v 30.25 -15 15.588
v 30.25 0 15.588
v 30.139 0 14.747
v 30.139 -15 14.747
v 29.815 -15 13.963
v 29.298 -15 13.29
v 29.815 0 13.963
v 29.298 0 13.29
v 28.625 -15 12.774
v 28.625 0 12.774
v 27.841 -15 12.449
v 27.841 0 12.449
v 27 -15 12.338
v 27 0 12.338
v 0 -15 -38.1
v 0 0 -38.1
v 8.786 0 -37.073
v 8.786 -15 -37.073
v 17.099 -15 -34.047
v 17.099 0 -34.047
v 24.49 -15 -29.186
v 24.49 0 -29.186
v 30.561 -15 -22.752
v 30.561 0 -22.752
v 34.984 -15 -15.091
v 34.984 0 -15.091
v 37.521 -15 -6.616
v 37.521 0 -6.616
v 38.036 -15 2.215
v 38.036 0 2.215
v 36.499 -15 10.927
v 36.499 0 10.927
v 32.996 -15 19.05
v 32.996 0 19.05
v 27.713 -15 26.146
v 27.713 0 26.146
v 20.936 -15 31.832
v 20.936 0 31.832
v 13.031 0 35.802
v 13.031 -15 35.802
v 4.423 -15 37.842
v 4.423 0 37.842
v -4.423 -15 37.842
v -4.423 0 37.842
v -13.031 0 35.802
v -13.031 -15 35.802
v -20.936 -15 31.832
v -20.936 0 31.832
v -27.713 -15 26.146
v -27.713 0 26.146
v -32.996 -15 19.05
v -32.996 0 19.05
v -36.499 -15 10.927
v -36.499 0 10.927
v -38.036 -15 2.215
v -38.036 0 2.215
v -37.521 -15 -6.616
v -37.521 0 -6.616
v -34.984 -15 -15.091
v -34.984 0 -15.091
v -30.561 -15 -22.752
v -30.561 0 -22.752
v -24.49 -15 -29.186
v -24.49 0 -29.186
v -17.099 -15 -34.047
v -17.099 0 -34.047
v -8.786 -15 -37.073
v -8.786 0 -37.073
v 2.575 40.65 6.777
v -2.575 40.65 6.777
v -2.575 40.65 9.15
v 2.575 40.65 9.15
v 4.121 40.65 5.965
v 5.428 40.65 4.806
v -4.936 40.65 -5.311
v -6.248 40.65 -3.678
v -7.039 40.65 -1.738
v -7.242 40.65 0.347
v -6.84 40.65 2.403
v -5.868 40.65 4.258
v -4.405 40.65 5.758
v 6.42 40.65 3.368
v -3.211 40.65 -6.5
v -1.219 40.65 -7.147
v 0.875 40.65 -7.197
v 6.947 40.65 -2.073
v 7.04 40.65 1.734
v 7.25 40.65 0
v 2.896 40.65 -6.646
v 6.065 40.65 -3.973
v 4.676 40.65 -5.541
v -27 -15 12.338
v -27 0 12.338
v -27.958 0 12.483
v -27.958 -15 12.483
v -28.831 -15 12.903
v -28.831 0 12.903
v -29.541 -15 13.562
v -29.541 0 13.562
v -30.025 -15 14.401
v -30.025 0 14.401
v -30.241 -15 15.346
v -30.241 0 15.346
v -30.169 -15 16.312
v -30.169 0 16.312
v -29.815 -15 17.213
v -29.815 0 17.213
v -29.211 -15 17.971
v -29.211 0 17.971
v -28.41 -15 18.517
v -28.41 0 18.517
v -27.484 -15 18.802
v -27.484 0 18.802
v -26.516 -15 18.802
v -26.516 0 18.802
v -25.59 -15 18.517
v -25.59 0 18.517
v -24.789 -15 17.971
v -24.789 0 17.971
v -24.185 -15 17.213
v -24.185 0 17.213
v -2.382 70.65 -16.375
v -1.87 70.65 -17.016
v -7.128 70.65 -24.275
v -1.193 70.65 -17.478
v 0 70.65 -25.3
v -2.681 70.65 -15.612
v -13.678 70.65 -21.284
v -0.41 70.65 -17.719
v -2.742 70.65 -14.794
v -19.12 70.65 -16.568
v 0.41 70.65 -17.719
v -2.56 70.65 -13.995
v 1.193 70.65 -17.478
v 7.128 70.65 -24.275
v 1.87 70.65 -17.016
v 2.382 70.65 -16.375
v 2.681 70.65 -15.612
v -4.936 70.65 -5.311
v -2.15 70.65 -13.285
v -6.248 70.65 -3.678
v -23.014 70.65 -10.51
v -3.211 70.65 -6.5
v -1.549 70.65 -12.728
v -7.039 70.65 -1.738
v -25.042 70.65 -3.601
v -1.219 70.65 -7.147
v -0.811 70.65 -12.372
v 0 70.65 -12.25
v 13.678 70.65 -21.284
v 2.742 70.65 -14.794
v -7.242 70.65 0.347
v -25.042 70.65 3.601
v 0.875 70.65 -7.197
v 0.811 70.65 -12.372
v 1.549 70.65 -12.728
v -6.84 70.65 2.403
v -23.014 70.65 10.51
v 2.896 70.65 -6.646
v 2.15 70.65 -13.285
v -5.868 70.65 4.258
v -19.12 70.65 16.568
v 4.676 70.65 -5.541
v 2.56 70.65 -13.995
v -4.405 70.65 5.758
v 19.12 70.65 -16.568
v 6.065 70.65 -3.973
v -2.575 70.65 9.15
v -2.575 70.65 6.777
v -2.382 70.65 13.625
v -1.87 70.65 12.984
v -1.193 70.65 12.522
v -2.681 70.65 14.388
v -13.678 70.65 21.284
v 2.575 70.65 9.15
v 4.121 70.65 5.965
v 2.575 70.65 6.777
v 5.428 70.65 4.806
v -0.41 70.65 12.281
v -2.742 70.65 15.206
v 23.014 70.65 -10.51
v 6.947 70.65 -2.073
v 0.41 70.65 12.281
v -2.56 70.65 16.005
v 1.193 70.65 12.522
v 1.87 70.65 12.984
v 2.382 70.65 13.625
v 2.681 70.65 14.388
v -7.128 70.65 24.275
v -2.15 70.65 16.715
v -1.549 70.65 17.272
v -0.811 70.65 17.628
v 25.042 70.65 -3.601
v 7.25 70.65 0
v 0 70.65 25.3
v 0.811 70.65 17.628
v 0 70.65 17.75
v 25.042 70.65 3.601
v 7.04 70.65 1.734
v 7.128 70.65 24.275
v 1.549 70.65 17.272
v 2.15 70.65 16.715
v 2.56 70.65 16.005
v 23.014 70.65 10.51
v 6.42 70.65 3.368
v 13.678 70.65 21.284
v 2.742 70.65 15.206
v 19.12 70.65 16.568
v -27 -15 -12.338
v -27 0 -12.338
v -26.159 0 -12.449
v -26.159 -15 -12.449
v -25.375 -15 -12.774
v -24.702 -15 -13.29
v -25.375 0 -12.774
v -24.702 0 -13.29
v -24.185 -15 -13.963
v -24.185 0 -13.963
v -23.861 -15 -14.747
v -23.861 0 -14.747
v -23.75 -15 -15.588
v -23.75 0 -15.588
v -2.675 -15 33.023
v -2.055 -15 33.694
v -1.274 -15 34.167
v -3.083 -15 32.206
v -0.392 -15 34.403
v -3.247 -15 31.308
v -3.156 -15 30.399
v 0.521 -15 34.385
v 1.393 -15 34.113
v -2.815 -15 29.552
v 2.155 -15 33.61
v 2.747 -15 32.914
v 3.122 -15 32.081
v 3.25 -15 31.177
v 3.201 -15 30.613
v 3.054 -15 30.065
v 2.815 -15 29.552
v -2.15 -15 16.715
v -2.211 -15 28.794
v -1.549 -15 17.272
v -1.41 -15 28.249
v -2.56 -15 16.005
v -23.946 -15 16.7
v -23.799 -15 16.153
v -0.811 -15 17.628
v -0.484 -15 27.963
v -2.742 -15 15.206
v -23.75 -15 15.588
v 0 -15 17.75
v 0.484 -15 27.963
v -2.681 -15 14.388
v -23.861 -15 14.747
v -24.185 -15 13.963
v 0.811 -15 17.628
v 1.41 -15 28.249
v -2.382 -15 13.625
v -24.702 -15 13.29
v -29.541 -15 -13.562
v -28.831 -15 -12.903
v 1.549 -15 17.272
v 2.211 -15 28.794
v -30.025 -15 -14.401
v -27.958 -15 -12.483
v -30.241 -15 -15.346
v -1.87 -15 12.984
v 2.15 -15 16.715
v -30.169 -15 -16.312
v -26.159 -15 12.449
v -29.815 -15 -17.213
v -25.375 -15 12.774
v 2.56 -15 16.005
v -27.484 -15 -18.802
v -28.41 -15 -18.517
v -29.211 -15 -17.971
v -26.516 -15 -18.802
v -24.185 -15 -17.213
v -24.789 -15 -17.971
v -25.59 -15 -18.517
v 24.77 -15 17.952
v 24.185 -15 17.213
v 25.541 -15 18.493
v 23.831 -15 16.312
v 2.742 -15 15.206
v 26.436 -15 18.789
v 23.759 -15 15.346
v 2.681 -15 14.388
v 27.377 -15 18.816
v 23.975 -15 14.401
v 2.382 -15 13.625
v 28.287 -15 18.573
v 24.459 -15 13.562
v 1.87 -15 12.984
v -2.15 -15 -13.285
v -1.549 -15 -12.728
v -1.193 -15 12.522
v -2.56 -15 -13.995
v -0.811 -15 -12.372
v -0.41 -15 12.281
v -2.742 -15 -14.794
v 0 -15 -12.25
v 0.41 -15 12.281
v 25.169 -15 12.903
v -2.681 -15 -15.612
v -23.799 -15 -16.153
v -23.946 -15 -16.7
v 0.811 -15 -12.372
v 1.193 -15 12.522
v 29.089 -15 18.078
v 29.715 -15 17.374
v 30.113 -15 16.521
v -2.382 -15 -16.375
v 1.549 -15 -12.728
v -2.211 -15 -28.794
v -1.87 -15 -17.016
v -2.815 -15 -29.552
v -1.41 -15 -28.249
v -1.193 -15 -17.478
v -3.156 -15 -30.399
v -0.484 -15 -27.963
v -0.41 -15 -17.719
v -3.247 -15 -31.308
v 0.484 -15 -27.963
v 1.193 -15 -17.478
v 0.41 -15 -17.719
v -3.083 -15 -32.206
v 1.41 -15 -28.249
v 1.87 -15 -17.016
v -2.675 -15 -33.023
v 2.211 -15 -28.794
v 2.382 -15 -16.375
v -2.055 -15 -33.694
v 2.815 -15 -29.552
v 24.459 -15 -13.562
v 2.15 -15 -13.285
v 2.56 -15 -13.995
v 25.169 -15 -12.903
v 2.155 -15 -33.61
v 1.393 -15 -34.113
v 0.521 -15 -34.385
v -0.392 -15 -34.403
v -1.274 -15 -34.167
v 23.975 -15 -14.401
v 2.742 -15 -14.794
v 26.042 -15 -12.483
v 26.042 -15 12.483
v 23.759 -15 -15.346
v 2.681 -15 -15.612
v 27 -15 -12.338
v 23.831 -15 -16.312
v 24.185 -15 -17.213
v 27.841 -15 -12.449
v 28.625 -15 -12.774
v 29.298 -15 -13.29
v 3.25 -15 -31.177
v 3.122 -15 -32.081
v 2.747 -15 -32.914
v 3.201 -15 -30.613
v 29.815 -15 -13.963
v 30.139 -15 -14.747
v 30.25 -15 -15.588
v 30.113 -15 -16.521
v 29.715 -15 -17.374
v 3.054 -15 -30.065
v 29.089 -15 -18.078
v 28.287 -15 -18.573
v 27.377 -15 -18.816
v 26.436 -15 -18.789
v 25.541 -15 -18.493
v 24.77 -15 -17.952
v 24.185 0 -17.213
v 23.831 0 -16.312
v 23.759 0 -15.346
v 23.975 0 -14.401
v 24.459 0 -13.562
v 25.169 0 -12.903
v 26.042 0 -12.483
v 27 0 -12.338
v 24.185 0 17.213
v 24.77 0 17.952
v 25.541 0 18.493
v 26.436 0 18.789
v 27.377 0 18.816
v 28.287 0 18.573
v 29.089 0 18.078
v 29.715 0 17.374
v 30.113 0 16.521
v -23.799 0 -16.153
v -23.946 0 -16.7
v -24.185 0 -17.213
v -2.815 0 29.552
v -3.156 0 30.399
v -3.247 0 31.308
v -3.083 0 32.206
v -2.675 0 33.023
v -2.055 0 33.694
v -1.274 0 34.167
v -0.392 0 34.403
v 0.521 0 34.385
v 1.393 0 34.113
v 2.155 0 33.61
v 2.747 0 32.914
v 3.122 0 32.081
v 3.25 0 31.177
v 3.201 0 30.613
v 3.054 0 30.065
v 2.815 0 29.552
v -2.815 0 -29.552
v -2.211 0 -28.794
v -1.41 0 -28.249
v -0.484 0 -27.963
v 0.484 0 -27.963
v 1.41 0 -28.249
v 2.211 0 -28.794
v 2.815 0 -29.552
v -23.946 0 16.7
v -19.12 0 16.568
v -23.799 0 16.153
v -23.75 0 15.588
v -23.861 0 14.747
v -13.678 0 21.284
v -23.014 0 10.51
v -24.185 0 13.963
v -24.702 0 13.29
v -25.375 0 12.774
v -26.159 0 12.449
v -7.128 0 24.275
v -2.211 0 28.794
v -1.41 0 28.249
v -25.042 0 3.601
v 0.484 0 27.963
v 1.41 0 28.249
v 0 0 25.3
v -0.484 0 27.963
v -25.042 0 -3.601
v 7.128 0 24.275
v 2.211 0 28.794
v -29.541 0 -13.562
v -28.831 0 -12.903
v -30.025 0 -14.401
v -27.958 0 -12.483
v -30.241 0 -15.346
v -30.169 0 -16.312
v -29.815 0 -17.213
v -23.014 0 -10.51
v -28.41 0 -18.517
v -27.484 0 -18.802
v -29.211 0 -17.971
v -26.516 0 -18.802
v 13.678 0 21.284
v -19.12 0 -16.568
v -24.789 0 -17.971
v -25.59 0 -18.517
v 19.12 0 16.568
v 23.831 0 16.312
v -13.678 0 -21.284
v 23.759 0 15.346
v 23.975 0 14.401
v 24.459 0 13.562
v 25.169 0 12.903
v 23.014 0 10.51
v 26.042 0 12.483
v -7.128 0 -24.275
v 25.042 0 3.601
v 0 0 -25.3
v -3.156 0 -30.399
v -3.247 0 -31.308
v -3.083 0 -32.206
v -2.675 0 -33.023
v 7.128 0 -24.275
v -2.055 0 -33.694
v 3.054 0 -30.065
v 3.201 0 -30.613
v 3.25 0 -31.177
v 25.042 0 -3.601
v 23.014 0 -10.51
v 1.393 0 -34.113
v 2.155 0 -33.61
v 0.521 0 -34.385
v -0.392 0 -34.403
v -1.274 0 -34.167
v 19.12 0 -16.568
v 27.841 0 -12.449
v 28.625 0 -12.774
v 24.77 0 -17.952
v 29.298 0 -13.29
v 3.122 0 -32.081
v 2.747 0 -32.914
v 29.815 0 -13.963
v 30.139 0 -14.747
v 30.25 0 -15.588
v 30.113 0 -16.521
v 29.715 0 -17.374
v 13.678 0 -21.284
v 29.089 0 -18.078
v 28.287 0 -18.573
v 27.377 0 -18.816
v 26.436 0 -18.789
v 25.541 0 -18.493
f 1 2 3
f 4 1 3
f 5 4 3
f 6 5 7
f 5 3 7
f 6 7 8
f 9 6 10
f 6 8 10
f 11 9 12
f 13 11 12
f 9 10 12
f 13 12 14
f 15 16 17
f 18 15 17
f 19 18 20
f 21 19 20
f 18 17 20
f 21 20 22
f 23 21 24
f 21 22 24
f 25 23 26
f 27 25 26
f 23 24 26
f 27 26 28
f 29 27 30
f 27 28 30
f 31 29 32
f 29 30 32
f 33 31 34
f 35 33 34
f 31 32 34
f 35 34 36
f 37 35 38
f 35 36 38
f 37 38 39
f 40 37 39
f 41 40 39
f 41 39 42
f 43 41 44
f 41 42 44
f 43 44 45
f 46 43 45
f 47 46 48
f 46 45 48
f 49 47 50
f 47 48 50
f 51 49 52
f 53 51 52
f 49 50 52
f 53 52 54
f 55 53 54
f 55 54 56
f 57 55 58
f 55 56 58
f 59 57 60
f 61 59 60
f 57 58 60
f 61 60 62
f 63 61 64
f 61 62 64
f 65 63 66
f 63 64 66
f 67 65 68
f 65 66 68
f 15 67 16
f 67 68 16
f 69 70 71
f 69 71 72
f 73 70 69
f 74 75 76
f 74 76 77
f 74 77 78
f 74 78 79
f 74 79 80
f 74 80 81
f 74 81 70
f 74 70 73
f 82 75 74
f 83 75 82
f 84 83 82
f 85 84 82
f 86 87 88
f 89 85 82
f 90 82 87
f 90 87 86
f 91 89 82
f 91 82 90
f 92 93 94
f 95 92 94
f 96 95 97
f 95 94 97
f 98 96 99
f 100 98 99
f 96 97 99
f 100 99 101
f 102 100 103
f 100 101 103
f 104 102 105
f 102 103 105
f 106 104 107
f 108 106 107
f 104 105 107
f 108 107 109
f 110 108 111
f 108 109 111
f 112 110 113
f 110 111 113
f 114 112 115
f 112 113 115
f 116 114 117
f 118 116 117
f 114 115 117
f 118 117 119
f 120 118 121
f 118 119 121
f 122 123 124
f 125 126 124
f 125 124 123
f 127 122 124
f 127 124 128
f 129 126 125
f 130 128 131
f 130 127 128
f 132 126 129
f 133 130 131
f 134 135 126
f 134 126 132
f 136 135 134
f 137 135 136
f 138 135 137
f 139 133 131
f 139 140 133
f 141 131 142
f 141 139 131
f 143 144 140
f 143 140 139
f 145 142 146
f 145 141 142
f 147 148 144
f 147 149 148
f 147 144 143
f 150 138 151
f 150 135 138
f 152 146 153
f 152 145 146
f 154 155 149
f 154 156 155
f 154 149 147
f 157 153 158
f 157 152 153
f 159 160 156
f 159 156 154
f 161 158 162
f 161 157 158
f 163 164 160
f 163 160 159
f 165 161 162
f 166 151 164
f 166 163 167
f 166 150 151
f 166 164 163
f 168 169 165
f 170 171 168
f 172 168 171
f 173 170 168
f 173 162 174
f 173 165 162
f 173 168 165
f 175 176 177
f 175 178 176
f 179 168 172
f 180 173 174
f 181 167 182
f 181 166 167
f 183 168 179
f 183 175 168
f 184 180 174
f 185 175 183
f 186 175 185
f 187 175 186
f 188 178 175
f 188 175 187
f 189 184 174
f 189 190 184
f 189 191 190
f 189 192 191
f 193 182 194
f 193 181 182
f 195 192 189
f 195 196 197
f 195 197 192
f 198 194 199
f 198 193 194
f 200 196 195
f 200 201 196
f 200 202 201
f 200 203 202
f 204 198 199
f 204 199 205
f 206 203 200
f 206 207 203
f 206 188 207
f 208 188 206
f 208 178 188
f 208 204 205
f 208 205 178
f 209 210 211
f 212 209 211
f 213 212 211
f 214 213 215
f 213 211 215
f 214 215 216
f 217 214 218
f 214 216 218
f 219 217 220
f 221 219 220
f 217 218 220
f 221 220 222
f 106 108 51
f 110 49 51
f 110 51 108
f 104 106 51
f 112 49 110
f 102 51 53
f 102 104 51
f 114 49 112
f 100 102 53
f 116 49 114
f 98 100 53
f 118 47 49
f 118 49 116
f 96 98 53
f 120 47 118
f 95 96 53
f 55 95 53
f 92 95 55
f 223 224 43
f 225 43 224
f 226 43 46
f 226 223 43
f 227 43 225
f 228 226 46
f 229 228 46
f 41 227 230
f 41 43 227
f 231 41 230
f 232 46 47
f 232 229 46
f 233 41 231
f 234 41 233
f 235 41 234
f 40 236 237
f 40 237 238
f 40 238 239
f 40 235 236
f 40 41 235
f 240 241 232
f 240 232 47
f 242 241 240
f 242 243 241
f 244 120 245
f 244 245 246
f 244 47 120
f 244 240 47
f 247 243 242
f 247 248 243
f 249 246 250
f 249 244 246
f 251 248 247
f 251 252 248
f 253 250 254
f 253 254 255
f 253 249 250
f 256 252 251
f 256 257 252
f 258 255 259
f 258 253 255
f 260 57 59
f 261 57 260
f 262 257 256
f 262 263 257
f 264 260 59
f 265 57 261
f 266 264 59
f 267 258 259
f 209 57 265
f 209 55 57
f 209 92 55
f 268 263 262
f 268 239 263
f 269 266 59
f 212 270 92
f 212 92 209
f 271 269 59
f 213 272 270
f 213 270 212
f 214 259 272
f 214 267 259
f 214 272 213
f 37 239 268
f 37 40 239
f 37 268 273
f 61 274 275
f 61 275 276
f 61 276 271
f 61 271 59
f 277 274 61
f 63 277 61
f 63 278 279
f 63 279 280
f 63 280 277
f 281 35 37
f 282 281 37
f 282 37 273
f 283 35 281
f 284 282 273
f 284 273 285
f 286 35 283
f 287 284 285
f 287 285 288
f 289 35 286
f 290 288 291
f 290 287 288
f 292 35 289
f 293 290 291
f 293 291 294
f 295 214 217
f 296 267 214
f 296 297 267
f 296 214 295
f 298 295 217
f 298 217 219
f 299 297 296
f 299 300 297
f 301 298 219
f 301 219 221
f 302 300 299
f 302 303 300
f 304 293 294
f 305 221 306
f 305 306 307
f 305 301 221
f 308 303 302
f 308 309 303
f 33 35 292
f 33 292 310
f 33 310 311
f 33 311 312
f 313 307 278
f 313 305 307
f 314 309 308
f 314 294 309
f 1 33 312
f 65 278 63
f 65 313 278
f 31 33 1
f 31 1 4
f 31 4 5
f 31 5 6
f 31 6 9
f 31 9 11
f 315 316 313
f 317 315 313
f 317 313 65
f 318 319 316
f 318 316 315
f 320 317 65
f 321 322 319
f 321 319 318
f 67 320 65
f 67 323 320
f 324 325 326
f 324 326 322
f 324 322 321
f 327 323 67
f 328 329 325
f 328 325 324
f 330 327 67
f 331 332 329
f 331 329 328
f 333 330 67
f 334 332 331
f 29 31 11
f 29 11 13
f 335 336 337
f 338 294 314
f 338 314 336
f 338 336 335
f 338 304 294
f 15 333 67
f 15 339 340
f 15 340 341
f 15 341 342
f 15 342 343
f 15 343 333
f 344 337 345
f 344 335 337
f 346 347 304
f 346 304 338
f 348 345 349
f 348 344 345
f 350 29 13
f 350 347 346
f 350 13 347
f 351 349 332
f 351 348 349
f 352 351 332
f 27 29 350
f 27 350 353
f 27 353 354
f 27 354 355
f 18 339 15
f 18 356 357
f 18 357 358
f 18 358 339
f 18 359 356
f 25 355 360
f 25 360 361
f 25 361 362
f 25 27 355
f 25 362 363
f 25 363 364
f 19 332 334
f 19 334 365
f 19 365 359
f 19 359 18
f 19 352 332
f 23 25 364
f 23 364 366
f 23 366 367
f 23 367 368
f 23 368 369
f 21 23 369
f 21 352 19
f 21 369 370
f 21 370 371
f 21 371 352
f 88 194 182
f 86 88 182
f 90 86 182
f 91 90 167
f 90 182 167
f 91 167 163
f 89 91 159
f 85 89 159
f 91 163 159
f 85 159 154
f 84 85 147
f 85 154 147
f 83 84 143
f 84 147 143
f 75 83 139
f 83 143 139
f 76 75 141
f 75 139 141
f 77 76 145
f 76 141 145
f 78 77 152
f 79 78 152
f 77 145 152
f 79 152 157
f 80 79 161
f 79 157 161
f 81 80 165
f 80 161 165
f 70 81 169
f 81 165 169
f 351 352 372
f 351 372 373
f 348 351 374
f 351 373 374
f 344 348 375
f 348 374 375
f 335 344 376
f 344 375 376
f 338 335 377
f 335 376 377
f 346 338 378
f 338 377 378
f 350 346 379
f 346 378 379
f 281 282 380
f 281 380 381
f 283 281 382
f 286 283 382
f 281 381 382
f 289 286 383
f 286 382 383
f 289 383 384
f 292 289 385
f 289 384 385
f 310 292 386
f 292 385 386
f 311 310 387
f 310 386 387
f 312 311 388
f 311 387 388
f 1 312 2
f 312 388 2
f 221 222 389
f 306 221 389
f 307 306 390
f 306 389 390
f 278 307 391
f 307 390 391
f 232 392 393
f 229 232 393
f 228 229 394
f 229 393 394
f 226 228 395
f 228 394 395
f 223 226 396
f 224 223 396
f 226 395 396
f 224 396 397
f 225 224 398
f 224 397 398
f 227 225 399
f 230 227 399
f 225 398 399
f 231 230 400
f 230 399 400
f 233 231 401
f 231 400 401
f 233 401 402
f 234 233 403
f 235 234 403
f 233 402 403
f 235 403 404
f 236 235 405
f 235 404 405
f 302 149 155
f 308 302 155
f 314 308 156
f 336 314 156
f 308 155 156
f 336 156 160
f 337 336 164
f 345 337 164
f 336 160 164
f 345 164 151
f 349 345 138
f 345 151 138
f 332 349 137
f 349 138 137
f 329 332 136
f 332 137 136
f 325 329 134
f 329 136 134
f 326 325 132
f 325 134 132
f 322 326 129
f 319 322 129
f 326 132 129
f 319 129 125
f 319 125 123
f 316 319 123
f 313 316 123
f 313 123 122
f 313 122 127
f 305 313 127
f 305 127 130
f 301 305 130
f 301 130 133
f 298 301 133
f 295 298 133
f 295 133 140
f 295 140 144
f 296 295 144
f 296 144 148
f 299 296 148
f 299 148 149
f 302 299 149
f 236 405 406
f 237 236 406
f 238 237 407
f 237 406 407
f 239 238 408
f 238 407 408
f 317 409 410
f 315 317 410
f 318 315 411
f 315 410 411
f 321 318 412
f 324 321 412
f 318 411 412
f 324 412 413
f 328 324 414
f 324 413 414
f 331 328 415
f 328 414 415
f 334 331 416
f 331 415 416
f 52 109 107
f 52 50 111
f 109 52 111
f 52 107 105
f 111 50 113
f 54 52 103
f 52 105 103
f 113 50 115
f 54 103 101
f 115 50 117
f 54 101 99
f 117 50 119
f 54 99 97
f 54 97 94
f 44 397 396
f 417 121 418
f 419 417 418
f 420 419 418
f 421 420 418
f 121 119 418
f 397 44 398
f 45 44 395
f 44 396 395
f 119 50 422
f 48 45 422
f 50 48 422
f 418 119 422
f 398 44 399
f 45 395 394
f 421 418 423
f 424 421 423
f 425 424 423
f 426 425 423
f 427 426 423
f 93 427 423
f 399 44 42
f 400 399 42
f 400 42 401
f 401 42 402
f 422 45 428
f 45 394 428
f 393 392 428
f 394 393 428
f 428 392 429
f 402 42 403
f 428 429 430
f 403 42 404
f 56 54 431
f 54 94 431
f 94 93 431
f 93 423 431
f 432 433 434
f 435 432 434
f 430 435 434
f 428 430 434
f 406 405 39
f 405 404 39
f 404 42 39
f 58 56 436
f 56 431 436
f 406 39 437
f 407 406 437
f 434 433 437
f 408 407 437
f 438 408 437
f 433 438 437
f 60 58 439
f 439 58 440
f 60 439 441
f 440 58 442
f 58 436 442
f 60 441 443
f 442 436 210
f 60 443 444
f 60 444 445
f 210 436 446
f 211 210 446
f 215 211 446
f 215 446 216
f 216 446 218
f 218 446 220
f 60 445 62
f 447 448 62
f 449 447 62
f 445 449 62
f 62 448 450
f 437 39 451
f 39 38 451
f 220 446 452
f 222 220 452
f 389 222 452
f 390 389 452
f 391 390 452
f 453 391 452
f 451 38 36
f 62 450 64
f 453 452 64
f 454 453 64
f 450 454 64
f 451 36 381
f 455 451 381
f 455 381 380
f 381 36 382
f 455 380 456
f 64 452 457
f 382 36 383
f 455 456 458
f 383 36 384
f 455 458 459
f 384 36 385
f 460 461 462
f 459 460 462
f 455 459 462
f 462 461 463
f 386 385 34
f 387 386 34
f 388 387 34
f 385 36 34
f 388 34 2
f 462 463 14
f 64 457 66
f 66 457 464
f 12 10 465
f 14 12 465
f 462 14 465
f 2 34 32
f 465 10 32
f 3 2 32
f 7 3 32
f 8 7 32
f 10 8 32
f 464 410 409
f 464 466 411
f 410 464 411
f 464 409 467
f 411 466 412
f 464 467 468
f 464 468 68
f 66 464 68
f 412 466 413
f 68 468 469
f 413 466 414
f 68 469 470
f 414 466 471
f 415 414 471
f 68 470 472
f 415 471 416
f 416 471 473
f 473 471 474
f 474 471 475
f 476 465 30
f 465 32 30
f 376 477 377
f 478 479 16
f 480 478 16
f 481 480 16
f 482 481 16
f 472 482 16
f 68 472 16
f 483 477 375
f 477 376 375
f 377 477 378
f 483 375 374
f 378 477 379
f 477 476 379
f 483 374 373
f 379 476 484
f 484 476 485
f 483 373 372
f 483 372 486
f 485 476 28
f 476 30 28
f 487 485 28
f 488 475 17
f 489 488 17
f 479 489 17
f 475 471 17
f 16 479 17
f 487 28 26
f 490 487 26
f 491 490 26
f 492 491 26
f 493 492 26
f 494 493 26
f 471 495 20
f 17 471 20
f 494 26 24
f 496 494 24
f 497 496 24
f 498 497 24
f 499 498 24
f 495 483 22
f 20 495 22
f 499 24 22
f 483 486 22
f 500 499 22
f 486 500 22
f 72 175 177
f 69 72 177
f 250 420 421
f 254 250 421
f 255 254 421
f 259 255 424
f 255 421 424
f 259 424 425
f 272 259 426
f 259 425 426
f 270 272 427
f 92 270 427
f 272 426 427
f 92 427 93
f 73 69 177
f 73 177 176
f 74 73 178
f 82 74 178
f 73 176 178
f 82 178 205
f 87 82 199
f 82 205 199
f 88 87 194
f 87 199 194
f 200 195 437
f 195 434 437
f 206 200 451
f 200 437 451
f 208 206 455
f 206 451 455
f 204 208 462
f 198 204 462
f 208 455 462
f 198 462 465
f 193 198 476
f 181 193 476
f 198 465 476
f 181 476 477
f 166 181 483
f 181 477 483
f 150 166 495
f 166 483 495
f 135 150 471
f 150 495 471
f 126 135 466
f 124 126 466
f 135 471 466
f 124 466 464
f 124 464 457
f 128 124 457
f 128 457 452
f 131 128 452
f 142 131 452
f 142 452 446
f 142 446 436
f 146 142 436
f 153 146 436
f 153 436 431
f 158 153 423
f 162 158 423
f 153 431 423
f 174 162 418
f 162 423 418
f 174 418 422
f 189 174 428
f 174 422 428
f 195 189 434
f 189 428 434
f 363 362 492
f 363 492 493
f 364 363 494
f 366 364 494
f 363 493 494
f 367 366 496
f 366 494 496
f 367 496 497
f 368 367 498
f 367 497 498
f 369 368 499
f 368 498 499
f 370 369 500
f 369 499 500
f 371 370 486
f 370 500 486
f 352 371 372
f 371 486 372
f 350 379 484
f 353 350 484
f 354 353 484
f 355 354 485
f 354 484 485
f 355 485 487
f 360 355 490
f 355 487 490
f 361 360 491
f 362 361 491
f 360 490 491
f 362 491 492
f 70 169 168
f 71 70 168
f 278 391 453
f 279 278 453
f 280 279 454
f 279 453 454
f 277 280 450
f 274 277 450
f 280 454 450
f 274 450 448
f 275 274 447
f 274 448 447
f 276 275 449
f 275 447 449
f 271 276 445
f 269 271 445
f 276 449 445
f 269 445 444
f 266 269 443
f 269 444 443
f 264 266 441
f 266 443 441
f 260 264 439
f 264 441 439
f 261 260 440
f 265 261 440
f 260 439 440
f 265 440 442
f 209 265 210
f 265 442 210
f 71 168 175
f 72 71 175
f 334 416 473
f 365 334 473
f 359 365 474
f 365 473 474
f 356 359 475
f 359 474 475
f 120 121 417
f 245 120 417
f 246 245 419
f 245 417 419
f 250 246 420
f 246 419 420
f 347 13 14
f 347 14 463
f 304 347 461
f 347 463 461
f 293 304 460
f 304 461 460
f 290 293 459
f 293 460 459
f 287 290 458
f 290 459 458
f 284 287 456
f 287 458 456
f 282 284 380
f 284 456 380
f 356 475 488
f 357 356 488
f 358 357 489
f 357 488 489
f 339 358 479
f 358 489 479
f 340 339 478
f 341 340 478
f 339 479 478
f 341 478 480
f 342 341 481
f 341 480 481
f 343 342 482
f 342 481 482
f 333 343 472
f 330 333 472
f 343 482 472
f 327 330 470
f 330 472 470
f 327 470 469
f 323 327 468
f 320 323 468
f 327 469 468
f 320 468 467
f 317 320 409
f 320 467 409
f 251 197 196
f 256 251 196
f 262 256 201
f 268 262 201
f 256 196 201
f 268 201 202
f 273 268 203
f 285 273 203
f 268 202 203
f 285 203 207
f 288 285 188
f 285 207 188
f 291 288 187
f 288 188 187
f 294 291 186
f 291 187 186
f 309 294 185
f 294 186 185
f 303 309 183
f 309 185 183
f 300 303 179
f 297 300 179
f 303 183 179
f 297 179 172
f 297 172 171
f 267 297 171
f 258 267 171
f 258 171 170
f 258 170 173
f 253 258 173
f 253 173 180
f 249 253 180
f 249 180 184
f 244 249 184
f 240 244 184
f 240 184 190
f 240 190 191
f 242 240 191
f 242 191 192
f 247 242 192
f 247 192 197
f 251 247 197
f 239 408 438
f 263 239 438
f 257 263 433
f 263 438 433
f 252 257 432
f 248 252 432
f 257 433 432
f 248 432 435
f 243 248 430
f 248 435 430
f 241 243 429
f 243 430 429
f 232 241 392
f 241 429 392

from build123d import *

# Parameters (mm, degrees)
SKETCH1_R           = 25.3
BOSS_EXTRUDE1_DEPTH = 8.5
SKETCH2_R           = 25.3
BOSS_EXTRUDE2_DEPTH = 57.15
SKETCH7_R           = 25.3
BOSS_EXTRUDE4_DEPTH = 15
CUT_EXTRUDE3_DEPTH  = 115
SKETCH6_R           = 38.1
BOSS_EXTRUDE3_DEPTH = 15
SKETCH9_R           = 3.25
CUT_EXTRUDE4_DEPTH  = 20
SKETCH10_R          = 2.75
CUT_EXTRUDE6_DEPTH  = 129
BOSS_EXTRUDE5_START = -93
BOSS_EXTRUDE5_DEPTH = 93
CUT_EXTRUDE7_DEPTH  = 40
CUT_EXTRUDE8_START  = -10
SKETCH12_R          = 25.3
CUT_EXTRUDE8_DEPTH  = 10


with BuildPart() as part:
    # Sketch1 → Boss-Extrude1 (new body)
    with BuildSketch(Plane(origin=(0, 0, 0), x_dir=(1, 0, 0), z_dir=(0, 1, 0))):
        Circle(SKETCH1_R)
    extrude(amount=BOSS_EXTRUDE1_DEPTH)

    # Sketch2 → Boss-Extrude2 (add)
    with BuildSketch(Plane(origin=(0, 8.5, 0), x_dir=(1, 0, 0), z_dir=(0, 1, 0))):
        Circle(SKETCH2_R)
    extrude(amount=BOSS_EXTRUDE2_DEPTH)

    # Sketch7 → Boss-Extrude4 (add)
    with BuildSketch(Plane(origin=(0, 65.65, 0), x_dir=(1, 0, 0), z_dir=(0, 1, 0))):
        Circle(SKETCH7_R)
    extrude(amount=BOSS_EXTRUDE4_DEPTH)

    # Sketch5 → Cut-Extrude3 (cut)
    with BuildSketch(Plane.XZ):
        with BuildLine():
            Line((2.575, 9.15), (-2.575, 9.15))
            Line((-2.575, 9.15), (-2.575, 6.777305881))
            ThreePointArc((-2.575, 6.777305881), (0, -7.25), (2.575, 6.777305881))
            Line((2.575, 6.777305881), (2.575, 9.15))
        make_face()
    extrude(amount=-CUT_EXTRUDE3_DEPTH, mode=Mode.SUBTRACT)

    # Sketch6 → Boss-Extrude3 (add)
    with BuildSketch(Plane.XZ):
        Circle(SKETCH6_R)
    extrude(amount=BOSS_EXTRUDE3_DEPTH)

    # Sketch9 → Cut-Extrude4 (cut)
    with BuildSketch(Plane(origin=(0, 0, 0), x_dir=(1, 0, 0), z_dir=(0, 1, 0))):
        with Locations((0, 31.176914536)):
            Circle(SKETCH9_R)
        with Locations((-27, 15.588457268)):
            Circle(SKETCH9_R)
        with Locations((27, 15.588457268)):
            Circle(SKETCH9_R)
        with Locations((-27, -15.588457268)):
            Circle(SKETCH9_R)
        with Locations((27, -15.588457268)):
            Circle(SKETCH9_R)
        with Locations((0, -31.176914536)):
            Circle(SKETCH9_R)
    extrude(amount=-CUT_EXTRUDE4_DEPTH, mode=Mode.SUBTRACT)

    # Sketch10 → Cut-Extrude6 (cut)
    with BuildSketch(Plane(origin=(0, 80.65, 0), x_dir=(1, 0, 0), z_dir=(0, 1, 0))):
        with Locations((0, 15)):
            Circle(SKETCH10_R)
        with Locations((0, -15)):
            Circle(SKETCH10_R)
    extrude(amount=-CUT_EXTRUDE6_DEPTH, mode=Mode.SUBTRACT)

    # Sketch11 → Boss-Extrude5 (add)
    with BuildSketch(Plane(origin=(0, 80.65, 0), x_dir=(1, 0, 0), z_dir=(0, 1, 0)).offset(BOSS_EXTRUDE5_START)):
        with BuildLine():
            Line((2.575, -9.15), (2.575, -6.777305881))
            ThreePointArc((2.575, -6.777305881), (0, 7.25), (-2.575, -6.777305881))
            Line((-2.575, -6.777305881), (-2.575, -9.15))
            Line((-2.575, -9.15), (2.575, -9.15))
        make_face()
    extrude(amount=BOSS_EXTRUDE5_DEPTH)

    # Sketch11<3> → Cut-Extrude7 (cut)
    with BuildSketch(Plane(origin=(0, 80.65, 0), x_dir=(1, 0, 0), z_dir=(0, 1, 0))):
        with BuildLine():
            Line((2.575, -9.15), (2.575, -6.777305881))
            ThreePointArc((2.575, -6.777305881), (0, 7.25), (-2.575, -6.777305881))
            Line((-2.575, -6.777305881), (-2.575, -9.15))
            Line((-2.575, -9.15), (2.575, -9.15))
        make_face()
    extrude(amount=-CUT_EXTRUDE7_DEPTH, mode=Mode.SUBTRACT)

    # Sketch12 → Cut-Extrude8 (cut)
    with BuildSketch(Plane(origin=(0, 80.65, 0), x_dir=(1, 0, 0), z_dir=(0, 1, 0)).offset(CUT_EXTRUDE8_START)):
        Circle(SKETCH12_R)
    extrude(amount=CUT_EXTRUDE8_DEPTH, mode=Mode.SUBTRACT)


solid = part.part
